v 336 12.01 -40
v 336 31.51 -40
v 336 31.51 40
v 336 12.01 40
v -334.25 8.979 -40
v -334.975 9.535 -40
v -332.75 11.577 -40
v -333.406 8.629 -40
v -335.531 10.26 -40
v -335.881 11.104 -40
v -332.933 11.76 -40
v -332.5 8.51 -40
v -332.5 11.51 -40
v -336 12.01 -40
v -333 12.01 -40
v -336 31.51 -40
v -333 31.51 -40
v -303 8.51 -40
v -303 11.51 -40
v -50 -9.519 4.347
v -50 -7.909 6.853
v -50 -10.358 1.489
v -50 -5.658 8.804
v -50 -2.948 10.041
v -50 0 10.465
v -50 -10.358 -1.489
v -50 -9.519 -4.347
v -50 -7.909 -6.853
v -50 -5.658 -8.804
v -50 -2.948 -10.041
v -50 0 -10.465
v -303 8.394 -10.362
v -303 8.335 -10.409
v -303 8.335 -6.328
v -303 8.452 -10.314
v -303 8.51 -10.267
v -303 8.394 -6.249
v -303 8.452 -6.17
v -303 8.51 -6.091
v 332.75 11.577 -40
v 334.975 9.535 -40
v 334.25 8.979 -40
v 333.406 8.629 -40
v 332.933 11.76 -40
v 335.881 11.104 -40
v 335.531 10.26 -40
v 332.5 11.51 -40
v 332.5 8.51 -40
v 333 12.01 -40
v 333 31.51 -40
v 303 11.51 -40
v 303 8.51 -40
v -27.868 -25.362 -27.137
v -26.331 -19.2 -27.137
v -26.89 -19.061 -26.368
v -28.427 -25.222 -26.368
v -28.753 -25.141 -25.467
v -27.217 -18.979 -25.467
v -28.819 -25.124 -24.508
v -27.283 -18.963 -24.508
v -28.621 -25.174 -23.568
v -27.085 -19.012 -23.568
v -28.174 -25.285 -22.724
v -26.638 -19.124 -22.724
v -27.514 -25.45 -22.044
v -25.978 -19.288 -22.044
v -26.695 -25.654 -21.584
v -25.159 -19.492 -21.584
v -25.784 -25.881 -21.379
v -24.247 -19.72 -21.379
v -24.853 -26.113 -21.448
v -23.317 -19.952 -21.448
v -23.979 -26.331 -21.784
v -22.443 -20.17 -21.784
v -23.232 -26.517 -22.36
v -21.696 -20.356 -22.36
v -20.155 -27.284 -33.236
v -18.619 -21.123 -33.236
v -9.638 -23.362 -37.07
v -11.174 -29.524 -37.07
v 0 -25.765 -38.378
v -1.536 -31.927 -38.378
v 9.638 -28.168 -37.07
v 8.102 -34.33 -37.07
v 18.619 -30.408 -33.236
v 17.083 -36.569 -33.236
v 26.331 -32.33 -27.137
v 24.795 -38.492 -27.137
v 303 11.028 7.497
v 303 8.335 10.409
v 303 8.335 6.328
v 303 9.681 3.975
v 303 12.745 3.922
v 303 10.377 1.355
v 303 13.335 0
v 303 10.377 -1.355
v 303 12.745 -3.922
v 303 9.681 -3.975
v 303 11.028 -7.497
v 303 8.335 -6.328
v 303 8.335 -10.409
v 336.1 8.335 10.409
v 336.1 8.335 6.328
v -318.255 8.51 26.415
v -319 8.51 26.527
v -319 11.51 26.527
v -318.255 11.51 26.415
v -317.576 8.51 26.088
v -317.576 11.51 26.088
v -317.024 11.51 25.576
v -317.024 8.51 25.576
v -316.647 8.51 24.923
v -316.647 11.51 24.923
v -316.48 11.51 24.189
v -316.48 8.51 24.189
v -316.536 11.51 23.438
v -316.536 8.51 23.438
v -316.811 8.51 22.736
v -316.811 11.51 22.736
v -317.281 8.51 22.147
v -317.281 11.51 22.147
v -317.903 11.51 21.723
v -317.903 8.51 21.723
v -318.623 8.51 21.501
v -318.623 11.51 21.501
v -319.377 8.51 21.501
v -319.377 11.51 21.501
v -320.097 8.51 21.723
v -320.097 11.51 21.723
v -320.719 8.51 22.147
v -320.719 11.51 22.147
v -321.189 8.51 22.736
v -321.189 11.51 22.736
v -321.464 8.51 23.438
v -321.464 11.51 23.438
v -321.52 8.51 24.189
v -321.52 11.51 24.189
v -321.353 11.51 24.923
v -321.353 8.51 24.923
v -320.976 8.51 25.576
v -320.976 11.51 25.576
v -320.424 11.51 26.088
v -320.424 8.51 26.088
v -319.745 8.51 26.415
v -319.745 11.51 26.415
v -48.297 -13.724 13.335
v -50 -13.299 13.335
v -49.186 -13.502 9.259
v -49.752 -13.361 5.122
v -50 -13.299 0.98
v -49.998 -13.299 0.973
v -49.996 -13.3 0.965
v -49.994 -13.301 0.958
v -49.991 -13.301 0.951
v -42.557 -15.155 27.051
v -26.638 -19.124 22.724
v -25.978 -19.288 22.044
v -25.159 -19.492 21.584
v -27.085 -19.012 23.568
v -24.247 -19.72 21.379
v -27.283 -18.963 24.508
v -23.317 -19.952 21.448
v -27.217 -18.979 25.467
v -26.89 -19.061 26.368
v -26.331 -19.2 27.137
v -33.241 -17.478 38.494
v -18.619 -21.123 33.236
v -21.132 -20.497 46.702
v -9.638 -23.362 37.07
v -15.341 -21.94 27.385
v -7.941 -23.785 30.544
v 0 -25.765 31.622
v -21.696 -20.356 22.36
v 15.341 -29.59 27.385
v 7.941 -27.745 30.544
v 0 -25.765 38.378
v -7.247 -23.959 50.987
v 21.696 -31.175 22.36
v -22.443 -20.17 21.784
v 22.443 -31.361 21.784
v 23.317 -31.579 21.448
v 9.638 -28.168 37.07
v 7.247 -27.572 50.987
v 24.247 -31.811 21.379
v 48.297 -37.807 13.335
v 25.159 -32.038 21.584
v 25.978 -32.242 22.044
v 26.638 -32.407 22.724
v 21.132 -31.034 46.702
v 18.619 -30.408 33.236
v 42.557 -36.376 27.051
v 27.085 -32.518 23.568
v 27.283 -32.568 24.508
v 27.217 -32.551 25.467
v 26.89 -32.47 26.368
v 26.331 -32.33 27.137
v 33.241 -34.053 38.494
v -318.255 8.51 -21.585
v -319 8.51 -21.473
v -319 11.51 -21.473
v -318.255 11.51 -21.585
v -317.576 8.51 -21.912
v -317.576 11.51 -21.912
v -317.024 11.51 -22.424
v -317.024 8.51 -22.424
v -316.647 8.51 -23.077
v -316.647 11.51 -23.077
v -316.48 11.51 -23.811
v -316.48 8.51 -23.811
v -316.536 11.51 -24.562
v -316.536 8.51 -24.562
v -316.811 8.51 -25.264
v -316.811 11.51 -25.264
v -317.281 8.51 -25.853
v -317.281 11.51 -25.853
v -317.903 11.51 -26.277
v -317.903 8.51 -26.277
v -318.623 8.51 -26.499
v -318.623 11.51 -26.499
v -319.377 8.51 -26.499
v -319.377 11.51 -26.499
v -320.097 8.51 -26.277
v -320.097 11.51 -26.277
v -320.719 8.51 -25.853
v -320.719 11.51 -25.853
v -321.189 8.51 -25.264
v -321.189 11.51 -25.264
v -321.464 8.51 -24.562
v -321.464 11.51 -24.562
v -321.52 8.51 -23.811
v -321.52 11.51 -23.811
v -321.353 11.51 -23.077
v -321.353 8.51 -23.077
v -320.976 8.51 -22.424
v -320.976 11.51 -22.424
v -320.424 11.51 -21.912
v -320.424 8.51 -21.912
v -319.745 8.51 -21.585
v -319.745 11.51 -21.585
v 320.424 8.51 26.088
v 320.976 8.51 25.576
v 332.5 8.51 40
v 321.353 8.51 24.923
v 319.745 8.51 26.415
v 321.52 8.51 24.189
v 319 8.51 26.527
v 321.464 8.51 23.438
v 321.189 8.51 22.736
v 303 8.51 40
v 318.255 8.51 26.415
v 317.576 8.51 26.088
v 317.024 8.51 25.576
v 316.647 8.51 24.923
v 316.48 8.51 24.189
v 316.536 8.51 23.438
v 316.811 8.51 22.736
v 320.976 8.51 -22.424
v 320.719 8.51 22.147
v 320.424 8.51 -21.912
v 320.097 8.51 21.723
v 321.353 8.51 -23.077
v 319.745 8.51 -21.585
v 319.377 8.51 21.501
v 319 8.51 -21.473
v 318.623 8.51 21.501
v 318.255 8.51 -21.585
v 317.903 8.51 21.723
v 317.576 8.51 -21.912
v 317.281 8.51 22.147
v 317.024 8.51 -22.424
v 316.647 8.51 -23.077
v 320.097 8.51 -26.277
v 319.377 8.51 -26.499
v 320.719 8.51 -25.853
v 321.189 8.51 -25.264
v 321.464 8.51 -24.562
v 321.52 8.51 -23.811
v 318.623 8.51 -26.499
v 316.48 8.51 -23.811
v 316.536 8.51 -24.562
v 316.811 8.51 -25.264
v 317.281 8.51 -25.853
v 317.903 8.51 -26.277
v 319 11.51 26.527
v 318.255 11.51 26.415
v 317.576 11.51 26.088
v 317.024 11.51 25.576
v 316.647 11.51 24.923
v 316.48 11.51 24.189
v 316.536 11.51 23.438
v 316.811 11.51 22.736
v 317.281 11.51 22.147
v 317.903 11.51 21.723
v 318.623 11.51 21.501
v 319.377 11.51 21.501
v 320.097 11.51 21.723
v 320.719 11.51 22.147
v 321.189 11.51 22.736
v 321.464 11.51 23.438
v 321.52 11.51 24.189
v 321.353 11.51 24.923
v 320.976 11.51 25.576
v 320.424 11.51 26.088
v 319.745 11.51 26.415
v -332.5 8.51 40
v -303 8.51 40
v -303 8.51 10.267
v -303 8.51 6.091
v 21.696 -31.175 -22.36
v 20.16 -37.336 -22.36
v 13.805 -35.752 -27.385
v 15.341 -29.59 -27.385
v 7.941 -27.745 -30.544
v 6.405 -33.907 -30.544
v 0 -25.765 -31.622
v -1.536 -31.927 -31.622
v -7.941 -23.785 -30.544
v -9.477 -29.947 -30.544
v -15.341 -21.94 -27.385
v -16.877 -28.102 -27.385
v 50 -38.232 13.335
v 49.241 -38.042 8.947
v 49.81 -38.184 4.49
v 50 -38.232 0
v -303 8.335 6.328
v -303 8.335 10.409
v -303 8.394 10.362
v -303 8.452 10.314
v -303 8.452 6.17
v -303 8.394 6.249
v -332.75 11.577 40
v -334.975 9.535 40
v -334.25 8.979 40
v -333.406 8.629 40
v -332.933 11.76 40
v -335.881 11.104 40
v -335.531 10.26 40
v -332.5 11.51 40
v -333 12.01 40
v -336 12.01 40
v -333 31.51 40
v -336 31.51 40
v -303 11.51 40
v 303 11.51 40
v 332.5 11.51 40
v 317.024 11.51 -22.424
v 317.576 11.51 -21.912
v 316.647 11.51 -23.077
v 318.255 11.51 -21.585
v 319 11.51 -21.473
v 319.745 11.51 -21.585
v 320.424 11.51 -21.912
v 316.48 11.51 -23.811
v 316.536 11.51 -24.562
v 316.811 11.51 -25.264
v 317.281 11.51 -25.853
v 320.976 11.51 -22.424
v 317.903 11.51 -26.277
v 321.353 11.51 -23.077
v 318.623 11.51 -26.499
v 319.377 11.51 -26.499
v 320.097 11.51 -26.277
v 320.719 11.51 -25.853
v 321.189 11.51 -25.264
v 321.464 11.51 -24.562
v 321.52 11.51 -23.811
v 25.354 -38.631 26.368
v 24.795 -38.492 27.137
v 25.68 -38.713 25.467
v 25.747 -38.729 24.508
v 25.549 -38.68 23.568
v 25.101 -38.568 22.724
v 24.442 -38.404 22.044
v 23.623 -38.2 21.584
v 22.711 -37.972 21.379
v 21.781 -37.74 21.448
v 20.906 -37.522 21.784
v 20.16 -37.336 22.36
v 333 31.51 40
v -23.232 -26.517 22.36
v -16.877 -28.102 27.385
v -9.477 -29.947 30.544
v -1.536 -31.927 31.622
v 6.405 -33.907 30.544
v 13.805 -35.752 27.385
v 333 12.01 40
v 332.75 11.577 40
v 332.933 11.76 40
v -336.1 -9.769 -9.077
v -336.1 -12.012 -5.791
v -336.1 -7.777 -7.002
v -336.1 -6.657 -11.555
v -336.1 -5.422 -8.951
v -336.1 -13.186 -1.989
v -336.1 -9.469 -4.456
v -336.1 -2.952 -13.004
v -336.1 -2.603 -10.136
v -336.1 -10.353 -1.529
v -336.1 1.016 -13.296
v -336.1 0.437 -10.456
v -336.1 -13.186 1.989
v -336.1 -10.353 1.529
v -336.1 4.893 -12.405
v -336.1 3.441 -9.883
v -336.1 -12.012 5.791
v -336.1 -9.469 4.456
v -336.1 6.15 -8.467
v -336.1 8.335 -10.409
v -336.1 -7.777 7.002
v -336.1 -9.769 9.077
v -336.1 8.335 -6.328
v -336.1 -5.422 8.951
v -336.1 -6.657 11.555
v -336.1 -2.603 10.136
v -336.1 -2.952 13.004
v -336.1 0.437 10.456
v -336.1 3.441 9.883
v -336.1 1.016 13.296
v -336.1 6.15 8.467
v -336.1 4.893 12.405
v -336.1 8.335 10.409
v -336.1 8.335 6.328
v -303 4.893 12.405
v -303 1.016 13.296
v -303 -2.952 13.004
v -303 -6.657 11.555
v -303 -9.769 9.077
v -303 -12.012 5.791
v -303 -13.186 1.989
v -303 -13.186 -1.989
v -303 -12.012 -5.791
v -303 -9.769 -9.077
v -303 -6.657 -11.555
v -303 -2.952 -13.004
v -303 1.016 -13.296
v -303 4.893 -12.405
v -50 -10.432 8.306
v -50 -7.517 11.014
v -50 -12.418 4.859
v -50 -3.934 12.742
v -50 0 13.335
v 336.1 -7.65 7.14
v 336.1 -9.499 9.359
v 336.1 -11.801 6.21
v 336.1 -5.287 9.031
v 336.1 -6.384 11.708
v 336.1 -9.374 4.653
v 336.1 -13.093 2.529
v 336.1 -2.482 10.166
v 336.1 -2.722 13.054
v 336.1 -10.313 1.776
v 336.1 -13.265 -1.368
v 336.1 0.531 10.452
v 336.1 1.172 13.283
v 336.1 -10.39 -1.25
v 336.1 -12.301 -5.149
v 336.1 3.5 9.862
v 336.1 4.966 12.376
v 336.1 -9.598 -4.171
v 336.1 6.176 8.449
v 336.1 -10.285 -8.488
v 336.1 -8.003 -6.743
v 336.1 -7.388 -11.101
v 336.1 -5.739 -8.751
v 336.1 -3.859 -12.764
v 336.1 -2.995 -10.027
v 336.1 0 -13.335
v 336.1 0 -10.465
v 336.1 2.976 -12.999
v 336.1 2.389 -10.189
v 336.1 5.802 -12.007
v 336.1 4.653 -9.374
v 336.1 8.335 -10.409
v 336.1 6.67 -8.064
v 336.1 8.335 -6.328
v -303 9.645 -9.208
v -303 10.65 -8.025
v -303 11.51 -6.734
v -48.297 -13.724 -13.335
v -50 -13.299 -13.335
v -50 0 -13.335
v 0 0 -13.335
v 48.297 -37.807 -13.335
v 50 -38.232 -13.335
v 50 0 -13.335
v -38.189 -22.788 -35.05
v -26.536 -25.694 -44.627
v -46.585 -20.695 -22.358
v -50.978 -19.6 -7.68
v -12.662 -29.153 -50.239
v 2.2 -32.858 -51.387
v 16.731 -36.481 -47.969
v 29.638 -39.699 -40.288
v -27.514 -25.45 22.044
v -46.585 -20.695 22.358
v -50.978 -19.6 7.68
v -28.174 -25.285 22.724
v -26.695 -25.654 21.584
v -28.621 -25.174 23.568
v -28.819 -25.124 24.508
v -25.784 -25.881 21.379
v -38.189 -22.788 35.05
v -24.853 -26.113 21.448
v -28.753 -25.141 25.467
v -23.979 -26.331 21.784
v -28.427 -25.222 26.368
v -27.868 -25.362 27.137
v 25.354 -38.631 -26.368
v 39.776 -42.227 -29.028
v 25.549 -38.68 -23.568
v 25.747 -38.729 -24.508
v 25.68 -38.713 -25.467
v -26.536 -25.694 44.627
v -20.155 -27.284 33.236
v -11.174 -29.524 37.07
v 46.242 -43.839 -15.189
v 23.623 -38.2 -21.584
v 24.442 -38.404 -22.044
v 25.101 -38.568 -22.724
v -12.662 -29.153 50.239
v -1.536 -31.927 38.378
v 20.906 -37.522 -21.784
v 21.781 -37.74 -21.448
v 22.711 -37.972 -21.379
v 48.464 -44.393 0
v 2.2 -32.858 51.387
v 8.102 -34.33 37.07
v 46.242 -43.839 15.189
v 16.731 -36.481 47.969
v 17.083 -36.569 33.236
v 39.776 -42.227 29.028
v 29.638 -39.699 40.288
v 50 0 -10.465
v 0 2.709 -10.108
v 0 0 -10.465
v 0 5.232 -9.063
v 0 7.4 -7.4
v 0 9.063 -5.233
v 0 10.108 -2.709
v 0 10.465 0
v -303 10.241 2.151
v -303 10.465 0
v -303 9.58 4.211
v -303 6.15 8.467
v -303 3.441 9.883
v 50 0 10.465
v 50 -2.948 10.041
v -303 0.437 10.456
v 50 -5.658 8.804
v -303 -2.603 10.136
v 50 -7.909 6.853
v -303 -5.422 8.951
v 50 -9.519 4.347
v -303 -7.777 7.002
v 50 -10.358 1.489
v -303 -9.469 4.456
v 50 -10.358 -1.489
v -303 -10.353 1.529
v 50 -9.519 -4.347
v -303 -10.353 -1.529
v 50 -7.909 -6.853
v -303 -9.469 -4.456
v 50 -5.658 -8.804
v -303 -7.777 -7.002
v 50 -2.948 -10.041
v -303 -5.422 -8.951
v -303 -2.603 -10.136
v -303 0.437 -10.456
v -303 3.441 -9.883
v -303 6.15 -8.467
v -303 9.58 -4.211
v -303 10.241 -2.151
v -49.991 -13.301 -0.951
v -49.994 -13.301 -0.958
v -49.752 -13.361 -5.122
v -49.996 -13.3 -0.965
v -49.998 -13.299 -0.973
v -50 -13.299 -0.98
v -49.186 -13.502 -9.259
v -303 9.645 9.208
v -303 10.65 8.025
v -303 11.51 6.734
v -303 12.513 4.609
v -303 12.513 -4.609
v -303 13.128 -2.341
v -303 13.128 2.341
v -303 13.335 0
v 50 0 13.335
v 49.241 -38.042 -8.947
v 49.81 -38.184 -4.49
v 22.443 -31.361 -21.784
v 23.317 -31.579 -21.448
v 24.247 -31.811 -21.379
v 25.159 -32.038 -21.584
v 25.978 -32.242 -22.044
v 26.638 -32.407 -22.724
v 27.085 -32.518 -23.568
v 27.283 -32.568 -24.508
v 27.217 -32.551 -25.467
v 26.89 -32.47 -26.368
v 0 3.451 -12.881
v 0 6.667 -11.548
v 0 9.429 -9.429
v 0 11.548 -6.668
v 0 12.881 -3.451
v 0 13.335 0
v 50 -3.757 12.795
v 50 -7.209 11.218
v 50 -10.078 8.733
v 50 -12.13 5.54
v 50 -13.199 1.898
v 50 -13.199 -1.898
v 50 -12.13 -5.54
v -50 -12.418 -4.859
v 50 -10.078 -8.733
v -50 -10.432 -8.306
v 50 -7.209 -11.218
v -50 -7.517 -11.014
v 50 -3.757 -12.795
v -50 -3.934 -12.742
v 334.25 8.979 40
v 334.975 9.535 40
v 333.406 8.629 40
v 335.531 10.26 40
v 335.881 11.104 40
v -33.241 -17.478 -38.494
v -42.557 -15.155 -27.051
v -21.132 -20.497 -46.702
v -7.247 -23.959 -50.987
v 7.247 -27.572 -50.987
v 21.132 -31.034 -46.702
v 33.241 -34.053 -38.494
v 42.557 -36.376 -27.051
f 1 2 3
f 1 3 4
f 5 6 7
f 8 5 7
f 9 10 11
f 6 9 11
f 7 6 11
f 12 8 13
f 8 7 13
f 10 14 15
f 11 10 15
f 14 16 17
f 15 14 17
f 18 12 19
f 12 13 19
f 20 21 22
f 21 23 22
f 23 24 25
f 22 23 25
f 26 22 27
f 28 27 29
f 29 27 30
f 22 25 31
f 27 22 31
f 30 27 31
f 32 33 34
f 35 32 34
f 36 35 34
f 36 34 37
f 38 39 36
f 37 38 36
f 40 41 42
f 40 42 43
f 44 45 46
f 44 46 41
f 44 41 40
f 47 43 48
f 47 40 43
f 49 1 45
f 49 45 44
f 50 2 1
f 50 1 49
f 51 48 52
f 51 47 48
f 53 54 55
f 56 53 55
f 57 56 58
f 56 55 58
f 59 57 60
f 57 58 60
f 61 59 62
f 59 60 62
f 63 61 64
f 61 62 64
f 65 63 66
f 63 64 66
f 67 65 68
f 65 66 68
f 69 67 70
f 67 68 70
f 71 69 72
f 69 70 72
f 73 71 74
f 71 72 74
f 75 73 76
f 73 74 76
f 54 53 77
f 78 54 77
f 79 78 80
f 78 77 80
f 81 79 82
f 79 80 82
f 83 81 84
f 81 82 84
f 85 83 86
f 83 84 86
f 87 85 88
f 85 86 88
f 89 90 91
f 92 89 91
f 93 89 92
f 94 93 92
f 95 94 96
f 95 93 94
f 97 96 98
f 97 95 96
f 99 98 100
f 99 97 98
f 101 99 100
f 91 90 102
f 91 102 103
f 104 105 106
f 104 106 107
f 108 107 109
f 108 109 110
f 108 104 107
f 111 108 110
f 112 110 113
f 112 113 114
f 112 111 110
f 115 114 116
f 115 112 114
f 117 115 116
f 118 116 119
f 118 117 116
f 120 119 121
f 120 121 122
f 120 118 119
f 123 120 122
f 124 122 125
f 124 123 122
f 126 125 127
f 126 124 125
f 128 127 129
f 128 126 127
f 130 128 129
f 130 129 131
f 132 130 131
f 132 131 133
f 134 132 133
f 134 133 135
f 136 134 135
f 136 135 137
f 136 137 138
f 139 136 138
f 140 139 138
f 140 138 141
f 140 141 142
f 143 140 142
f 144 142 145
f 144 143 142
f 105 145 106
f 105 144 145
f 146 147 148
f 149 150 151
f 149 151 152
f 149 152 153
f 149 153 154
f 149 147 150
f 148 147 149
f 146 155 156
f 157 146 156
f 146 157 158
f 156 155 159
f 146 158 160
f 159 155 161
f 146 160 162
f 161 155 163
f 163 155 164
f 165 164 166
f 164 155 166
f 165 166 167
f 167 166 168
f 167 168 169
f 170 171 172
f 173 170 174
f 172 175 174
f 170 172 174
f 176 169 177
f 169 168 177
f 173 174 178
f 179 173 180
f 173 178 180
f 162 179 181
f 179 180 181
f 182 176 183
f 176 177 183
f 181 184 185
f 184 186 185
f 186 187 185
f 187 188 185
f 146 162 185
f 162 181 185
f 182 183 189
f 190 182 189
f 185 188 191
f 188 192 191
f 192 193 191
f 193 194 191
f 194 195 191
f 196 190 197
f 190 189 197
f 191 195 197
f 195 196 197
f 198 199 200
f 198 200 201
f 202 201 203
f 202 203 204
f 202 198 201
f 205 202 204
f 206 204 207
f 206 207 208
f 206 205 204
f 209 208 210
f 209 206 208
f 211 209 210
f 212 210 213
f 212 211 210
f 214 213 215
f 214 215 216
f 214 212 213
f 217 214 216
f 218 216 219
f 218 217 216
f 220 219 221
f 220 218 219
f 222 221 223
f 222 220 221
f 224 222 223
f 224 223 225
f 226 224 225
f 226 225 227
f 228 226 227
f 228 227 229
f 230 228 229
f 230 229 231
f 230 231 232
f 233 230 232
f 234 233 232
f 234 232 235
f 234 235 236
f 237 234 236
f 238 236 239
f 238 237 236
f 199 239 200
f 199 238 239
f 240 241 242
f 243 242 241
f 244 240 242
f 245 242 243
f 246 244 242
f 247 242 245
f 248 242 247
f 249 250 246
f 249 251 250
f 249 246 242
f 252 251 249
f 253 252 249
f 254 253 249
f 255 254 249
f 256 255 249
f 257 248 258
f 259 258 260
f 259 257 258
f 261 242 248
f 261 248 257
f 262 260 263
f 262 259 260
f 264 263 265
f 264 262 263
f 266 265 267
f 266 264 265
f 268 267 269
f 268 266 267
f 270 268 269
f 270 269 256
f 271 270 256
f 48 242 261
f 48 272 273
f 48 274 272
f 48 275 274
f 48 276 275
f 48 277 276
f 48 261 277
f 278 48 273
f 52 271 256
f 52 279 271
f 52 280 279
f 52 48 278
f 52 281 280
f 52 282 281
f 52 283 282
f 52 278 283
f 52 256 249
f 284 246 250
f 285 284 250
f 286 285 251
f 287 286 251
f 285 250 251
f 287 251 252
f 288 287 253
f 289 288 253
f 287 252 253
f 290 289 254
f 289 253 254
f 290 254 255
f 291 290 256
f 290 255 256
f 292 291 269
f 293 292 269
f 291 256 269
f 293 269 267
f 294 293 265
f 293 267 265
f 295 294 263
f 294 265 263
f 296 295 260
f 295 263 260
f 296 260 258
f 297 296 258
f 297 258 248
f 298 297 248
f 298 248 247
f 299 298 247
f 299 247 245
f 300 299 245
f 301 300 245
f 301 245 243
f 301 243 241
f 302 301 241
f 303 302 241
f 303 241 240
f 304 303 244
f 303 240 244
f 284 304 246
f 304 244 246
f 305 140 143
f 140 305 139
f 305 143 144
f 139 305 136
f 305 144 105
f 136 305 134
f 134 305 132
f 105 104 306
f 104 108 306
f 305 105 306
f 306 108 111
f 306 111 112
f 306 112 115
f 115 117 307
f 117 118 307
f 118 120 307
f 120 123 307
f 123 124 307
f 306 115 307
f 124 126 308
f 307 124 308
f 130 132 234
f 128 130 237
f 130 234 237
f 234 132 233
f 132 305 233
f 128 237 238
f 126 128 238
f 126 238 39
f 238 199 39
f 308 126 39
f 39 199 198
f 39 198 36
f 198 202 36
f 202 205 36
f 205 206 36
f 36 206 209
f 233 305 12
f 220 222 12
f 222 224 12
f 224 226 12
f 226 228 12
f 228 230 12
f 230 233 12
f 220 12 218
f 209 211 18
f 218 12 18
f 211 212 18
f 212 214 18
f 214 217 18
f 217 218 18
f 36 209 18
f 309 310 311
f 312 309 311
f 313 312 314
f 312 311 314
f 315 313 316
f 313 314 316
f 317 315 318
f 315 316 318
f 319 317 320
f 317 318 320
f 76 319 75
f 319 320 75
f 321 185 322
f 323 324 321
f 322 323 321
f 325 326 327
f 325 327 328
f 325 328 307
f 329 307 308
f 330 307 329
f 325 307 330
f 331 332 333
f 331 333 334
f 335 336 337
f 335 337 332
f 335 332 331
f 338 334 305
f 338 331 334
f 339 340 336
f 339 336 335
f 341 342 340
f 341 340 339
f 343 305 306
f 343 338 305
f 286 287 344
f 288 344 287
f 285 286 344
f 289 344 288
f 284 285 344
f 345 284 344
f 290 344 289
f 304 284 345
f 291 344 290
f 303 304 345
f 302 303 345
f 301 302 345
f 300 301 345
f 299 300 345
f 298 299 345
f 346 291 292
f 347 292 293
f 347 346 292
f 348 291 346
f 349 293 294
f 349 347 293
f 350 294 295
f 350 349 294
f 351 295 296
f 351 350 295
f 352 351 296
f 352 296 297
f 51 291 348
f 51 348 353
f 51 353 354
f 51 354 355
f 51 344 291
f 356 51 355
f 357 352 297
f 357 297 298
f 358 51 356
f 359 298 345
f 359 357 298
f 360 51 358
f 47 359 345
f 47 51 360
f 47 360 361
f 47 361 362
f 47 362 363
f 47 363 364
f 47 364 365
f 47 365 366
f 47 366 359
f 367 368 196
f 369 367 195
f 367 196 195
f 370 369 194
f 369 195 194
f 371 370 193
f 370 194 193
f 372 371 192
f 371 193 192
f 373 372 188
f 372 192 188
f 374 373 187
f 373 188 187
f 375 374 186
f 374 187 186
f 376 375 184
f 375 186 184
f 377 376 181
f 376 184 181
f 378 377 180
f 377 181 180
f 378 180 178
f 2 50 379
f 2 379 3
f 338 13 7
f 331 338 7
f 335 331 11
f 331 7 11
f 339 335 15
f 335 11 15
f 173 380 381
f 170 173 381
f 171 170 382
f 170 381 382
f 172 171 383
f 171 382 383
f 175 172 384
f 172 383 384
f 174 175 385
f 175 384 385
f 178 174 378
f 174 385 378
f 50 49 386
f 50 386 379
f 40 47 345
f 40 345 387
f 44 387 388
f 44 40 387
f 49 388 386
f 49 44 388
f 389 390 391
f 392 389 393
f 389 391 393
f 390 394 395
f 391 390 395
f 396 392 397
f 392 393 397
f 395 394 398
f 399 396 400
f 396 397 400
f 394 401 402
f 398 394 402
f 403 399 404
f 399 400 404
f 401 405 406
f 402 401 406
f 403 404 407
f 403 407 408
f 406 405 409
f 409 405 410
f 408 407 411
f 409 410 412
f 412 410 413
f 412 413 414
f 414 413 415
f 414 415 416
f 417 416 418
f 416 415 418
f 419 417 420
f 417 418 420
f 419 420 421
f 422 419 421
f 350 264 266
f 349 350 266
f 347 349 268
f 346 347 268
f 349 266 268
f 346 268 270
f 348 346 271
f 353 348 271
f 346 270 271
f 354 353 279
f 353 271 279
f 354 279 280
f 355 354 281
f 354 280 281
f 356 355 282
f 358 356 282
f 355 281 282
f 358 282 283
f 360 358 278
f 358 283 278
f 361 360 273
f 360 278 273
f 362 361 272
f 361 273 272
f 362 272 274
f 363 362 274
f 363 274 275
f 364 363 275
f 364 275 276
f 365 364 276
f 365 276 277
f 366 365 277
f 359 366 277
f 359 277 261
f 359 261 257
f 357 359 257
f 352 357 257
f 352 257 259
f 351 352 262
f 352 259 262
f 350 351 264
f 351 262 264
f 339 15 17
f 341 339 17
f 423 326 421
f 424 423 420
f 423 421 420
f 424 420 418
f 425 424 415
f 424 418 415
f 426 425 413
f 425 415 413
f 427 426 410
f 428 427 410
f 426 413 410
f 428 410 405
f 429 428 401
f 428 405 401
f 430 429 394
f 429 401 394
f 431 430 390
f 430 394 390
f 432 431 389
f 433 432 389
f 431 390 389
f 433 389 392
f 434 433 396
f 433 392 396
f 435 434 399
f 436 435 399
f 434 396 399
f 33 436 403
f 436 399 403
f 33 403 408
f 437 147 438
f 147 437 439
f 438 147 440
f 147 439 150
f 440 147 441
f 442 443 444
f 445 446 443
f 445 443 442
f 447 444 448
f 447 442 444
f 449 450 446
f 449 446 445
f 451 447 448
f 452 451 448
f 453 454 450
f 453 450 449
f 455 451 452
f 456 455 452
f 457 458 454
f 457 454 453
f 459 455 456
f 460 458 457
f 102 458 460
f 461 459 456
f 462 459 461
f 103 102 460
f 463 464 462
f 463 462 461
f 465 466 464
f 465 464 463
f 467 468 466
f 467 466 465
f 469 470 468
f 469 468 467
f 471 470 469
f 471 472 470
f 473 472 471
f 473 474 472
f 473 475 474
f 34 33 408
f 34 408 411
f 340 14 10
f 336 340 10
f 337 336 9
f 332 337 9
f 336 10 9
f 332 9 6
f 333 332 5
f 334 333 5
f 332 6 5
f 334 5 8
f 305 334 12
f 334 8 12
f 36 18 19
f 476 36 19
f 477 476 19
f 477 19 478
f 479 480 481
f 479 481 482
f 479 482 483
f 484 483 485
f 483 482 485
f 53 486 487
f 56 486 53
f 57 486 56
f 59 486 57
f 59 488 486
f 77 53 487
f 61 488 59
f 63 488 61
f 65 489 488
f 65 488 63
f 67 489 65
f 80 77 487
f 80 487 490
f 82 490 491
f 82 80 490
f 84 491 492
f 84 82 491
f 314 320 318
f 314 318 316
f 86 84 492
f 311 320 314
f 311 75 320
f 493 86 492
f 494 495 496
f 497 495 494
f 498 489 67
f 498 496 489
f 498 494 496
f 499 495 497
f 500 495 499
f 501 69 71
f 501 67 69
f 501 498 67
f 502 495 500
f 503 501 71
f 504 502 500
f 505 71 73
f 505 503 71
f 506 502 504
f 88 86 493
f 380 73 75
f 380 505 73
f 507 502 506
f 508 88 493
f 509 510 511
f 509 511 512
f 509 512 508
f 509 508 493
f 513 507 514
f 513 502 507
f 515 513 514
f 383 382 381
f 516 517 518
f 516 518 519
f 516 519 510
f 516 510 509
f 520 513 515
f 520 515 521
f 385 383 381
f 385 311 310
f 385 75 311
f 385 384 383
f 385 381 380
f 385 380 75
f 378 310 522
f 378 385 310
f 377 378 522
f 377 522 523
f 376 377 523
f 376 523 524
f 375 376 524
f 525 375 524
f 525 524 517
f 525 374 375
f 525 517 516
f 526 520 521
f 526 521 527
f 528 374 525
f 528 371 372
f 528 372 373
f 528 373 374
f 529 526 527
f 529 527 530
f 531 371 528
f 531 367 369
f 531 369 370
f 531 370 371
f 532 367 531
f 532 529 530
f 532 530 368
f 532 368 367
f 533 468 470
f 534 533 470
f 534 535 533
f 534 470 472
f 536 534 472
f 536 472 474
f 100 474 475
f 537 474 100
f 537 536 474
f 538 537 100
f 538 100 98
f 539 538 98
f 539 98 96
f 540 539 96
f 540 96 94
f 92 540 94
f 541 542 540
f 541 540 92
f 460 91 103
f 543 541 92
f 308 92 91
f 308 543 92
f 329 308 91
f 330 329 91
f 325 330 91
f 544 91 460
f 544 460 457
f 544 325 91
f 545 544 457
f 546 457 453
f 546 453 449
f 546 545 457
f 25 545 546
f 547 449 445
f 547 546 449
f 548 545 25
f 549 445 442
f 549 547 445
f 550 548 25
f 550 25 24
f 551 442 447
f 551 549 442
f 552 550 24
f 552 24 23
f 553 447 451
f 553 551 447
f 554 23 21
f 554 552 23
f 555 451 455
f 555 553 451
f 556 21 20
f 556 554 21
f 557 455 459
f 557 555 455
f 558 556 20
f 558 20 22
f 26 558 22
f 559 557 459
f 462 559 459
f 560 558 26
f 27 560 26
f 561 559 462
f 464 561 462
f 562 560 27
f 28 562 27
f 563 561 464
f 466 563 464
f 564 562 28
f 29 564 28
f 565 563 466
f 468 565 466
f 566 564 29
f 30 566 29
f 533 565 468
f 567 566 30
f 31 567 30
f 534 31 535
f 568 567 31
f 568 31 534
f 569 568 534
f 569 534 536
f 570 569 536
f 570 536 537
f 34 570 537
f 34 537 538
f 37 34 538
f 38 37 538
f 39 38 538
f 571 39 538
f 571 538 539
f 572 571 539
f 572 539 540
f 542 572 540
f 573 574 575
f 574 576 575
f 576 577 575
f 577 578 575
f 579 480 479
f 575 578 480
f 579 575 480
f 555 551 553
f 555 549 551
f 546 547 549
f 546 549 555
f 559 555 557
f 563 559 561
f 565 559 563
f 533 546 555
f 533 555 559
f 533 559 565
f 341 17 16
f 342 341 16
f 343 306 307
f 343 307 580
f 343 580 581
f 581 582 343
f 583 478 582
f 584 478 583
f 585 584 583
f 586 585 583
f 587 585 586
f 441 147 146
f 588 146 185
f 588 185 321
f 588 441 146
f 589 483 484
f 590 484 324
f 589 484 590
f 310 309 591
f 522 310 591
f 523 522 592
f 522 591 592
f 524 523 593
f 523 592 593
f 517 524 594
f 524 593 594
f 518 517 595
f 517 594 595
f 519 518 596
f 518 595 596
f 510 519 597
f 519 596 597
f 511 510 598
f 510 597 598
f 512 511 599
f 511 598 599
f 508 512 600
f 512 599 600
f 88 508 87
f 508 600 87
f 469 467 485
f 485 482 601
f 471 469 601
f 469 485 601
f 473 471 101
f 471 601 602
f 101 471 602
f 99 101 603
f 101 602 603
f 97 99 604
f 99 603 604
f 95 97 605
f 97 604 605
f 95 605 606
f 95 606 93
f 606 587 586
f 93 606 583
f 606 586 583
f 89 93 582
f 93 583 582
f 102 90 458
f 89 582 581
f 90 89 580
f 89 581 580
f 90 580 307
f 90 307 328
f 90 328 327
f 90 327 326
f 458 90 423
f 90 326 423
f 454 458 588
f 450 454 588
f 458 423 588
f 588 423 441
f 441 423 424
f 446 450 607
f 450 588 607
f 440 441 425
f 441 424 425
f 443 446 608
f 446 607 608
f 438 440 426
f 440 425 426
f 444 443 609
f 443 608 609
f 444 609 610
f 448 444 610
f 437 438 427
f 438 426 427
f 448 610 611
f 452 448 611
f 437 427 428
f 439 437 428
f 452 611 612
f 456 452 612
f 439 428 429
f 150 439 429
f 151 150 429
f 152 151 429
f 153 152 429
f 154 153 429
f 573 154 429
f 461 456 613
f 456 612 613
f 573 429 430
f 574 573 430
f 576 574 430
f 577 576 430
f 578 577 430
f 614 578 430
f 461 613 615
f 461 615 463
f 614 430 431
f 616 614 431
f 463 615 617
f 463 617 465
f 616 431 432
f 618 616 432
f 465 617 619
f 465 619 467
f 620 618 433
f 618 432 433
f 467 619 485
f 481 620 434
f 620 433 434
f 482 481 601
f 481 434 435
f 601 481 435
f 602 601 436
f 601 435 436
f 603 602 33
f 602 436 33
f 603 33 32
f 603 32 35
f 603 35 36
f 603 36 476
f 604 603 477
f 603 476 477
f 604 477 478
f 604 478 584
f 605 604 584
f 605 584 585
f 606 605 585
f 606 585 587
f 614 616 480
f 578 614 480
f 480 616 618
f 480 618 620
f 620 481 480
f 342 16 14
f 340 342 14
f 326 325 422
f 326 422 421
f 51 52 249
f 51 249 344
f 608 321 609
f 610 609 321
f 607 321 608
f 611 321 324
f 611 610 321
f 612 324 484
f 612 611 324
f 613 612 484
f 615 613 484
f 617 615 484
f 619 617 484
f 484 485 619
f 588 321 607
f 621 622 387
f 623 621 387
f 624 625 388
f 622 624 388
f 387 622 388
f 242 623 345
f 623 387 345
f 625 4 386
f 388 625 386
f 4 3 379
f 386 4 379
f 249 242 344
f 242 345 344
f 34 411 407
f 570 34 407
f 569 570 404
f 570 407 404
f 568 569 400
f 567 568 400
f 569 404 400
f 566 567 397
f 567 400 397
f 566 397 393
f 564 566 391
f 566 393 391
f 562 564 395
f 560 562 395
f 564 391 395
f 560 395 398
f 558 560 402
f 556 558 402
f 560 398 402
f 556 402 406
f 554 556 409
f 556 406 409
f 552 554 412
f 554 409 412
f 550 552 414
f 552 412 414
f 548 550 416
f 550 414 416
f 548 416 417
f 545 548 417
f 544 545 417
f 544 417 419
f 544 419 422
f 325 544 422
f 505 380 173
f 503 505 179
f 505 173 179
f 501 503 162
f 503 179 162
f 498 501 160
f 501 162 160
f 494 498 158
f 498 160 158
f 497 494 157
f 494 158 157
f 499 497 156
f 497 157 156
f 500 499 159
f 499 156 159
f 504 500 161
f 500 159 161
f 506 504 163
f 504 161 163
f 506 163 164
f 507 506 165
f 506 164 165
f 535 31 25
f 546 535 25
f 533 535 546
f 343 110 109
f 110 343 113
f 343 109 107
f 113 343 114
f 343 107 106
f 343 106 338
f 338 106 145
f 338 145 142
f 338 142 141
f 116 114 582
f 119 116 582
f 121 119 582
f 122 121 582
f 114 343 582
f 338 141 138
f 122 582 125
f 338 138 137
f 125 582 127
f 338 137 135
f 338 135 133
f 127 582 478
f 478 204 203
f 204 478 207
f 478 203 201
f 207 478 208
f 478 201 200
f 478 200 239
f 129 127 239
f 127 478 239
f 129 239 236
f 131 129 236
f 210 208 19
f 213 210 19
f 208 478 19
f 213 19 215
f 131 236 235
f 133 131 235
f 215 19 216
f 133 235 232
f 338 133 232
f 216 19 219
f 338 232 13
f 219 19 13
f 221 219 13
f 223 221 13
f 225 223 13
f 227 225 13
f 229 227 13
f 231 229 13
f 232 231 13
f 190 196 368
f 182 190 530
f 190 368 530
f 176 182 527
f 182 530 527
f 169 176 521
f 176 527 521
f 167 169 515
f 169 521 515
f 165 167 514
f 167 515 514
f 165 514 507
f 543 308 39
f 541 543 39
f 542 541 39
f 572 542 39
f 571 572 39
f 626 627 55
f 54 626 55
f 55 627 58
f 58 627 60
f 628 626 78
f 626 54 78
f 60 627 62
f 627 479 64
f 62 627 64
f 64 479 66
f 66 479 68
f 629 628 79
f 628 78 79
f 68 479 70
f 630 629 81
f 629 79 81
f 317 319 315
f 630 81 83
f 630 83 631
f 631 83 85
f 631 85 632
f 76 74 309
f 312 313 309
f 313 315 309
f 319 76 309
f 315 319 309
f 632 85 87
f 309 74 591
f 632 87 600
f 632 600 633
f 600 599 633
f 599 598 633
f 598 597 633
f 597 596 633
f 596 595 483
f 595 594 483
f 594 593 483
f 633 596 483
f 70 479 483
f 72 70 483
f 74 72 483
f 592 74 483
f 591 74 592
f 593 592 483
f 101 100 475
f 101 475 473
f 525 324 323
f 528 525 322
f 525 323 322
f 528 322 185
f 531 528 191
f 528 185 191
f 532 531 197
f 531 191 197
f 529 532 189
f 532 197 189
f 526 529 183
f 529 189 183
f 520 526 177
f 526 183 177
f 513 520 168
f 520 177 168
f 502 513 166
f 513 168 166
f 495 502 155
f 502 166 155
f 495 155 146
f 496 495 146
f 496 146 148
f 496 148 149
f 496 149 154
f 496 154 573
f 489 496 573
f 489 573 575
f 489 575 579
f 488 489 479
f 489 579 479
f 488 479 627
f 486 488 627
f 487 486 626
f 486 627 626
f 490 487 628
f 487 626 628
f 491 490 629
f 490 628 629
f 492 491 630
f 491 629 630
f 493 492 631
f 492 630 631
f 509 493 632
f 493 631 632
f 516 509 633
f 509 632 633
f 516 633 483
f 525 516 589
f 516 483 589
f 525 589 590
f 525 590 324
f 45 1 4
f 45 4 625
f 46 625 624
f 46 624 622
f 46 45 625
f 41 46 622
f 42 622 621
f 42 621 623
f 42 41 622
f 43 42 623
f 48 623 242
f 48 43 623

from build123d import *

# Parameters (mm, degrees)
SKETCH1_R                           = 13.335
SKETCH1_R_2                         = 10.465
BOSS_EXTRUDE1_DEPTH                 = 336.1
CUT_EXTRUDE3_START                  = -33.1
CUT_EXTRUDE3_DEPTH                  = 33.1
BASE_FLANGE2_DEPTH                  = 40
BASE_FLANGE2_DEPTH_BACK             = 40
SKETCH36_W                          = 2.5273
SKETCH36_H                          = 50
F_8_0_199_DIAMETER_HOLE4_AT_2_COUNT = 2
F_8_0_199_DIAMETER_HOLE4_AT_2_PITCH = 48
MIRROR5_START                       = -303
MIRROR5_OUTLINE_R                   = 13.335
MIRROR5_OUTLINE_R_2                 = 10.465
MIRROR5_DEPTH                       = 303
MIRROR5_START_2                     = -336.1
MIRROR5_2_DEPTH                     = 33.1
BOSS_EXTRUDE3_REACH                 = 341.935
SKETCH39_W                          = 100
SKETCH39_H                          = 26.67
SKETCH40_R                          = 51.530681467
BOSS_EXTRUDE4_DEPTH                 = 6.35
SKETCH43_W                          = 3.3782
SKETCH43_H                          = 143.233967446
F_1_4_CLEARANCE_HOLE1_AT_2_COUNT    = 2
F_1_4_CLEARANCE_HOLE1_AT_2_PITCH    = 49.497474683
F_1_4_CLEARANCE_HOLE1_AT_3_COUNT    = 2
F_1_4_CLEARANCE_HOLE1_AT_3_PITCH    = 70
F_1_4_CLEARANCE_HOLE1_AT_4_COUNT    = 2
F_1_4_CLEARANCE_HOLE1_AT_4_PITCH    = 49.497474683
F_1_4_CLEARANCE_HOLE1_AT_5_COUNT    = 2
F_1_4_CLEARANCE_HOLE1_AT_5_PITCH    = 26.787840266
F_1_4_CLEARANCE_HOLE1_AT_6_COUNT    = 2
F_1_4_CLEARANCE_HOLE1_AT_6_PITCH    = 64.671567276
CUT_EXTRUDE4_DEPTH                  = 354.000635368


# Read off the part's stored shape, not the designer's step: Mirror5
# Sheet-metal steps are written as plain solids
with BuildPart() as part:
    # Sketch1 → Boss-Extrude1 (new body)
    with BuildSketch(Plane(origin=(0, 0, 0), x_dir=(0, 0, -1), z_dir=(1, 0, 0))):
        Circle(SKETCH1_R)
        Circle(SKETCH1_R_2, mode=Mode.SUBTRACT)
    extrude(amount=BOSS_EXTRUDE1_DEPTH)

    # Sketch4 → Cut-Extrude3 (cut)
    with BuildSketch(Plane(origin=(336.1, 0, 0), x_dir=(0, 0, -1), z_dir=(1, 0, 0)).offset(CUT_EXTRUDE3_START)):
        with BuildLine():
            Line((-10.409130607, 8.335), (10.409130607, 8.335))
            ThreePointArc((10.409130607, 8.335), (0, 13.335), (-10.409130607, 8.335))
        make_face()
    extrude(amount=CUT_EXTRUDE3_DEPTH, mode=Mode.SUBTRACT)



with BuildPart() as body_2:
    # Sketch31 → Base-Flange2 (new, two sides: drawn at the far end of the back side and taken through both)
    with BuildSketch(Plane.XY.offset(-BASE_FLANGE2_DEPTH_BACK)):
        with BuildLine():
            Line((303, 11.51), (332.5, 11.51))
            ThreePointArc((332.5, 11.51), (332.853553391, 11.656446609), (333, 12.01))
            Line((333, 12.01), (333, 31.51))
            Line((333, 31.51), (336, 31.51))
            Line((336, 31.51), (336, 12.01))
            ThreePointArc((336, 12.01), (334.974873734, 9.535126266), (332.5, 8.51))
            Line((332.5, 8.51), (303, 8.51))
            Line((303, 8.51), (303, 11.51))
        make_face()
    extrude(amount=BASE_FLANGE2_DEPTH + BASE_FLANGE2_DEPTH_BACK)

    # Sketch36 → #8 (0.199) Diameter Hole4 (revolve, cut)
    with BuildSketch(Plane(origin=(319, 11.51, -24), x_dir=(0, 0, 1), z_dir=(1, 0, 0))):
        with Locations((1.26365, 25)):
            Rectangle(SKETCH36_W, SKETCH36_H)
    f_8_0_199_diameter_hole4 = revolve(axis=Axis((319, 17.86, -24), (0, -1, 0)), mode=Mode.SUBTRACT)

    # #8 (0.199) Diameter Hole4 at 2: #8 (0.199) Diameter Hole4 ×2
    with Locations(*[(0, 0, i * F_8_0_199_DIAMETER_HOLE4_AT_2_PITCH) for i in range(1, F_8_0_199_DIAMETER_HOLE4_AT_2_COUNT)]):
        add(f_8_0_199_diameter_hole4, mode=Mode.SUBTRACT)


with BuildPart() as body_3:
    # Mirror4: mirrored copy
    add(body_2.part.mirror(Plane(origin=(0, 0, 0), x_dir=(0, 0, 1), z_dir=(1, 0, 0))))


with BuildPart() as part_1:
    add(part.part)

    add(body_3.part)  # Mirror5 merges body 3
    # Mirror5 outline → Mirror5 (add)
    with BuildSketch(Plane.YZ.offset(MIRROR5_START)):
        Circle(MIRROR5_OUTLINE_R)
        Circle(MIRROR5_OUTLINE_R_2, mode=Mode.SUBTRACT)
    extrude(amount=MIRROR5_DEPTH)

    # Mirror5 2 outline → Mirror5 2 (add)
    with BuildSketch(Plane.YZ.offset(MIRROR5_START_2)):
        with BuildLine():
            Line((8.335, 6.32803287), (8.335, 10.409130607))
            ThreePointArc((8.335, 10.409130607), (-13.335, 0), (8.335, -10.409130607))
            Line((8.335, -10.409130607), (8.335, -6.32803287))
            ThreePointArc((8.335, -6.32803287), (-10.465, 0), (8.335, 6.32803287))
        make_face()
    extrude(amount=MIRROR5_2_DEPTH)

    # Boss-Extrude3: up to this plane
    boss_extrude3_end = Plane(origin=(-6.04804739, -24.257393157, 0), z_dir=(0.24192189559967145, 0.9702957262759956, 0))
    # Sketch39 → Boss-Extrude3 (add, up to the surface)
    with BuildSketch(Plane(origin=(0, 0, 0), x_dir=(1, 0, 0), z_dir=(0, 1, 0)), mode=Mode.PRIVATE) as boss_extrude3_sk1:
        Rectangle(SKETCH39_W, SKETCH39_H)
    boss_extrude3_tool1 = split(extrude(boss_extrude3_sk1.sketch, amount=-BOSS_EXTRUDE3_REACH, mode=Mode.PRIVATE), bisect_by=boss_extrude3_end, keep=Keep.BOTH, mode=Mode.PRIVATE)
    add(boss_extrude3_tool1.solids().sort_by_distance((0, 0, 0))[0])

    # Sketch40 → Boss-Extrude4 (add)
    with BuildSketch(Plane(origin=(-6.04804739, -24.257393157, 0), x_dir=(-0.9702957262759956, 0.24192189559967145, 0), z_dir=(-0.24192189559967145, -0.9702957262759956, 0))):
        with Locations(Location((-6.233200071, 0, 0), (0, 0, 180))):
            Circle(SKETCH40_R)
    extrude(amount=BOSS_EXTRUDE4_DEPTH)

    # Sketch43 → 1/4 Clearance Hole1 (revolve, cut)
    with BuildSketch(Plane(origin=(-25.54979811, -25.939457144, 24.748737342), x_dir=(0.9702957262759956, -0.24192189559967145, 0), z_dir=(0, 0, 1))):
        with Locations((1.6891, 71.616983723)):
            Rectangle(SKETCH43_W, SKETCH43_H)
    f_1_4_clearance_hole1 = revolve(axis=Axis((-27.086002147, -32.100835006, 24.748737342), (0.24192189559967142, 0.9702957262759956, 0)), mode=Mode.SUBTRACT)

    # 1/4 Clearance Hole1 at 2: 1/4 Clearance Hole1 ×2
    with Locations(*[Vector(0.9702957262759956, -0.24192189559967142, -4.076857218435412e-13) * (i * F_1_4_CLEARANCE_HOLE1_AT_2_PITCH) for i in range(1, F_1_4_CLEARANCE_HOLE1_AT_2_COUNT)]):
        add(f_1_4_clearance_hole1, mode=Mode.SUBTRACT)

    # 1/4 Clearance Hole1 at 3: 1/4 Clearance Hole1 ×2
    with Locations(*[Vector(0.6861026878060814, -0.17106461289603136, -0.7071067811865488) * (i * F_1_4_CLEARANCE_HOLE1_AT_3_PITCH) for i in range(1, F_1_4_CLEARANCE_HOLE1_AT_3_COUNT)]):
        add(f_1_4_clearance_hole1, mode=Mode.SUBTRACT)

    # 1/4 Clearance Hole1 at 4: 1/4 Clearance Hole1 ×2
    with Locations(*[(0, 0, -i * F_1_4_CLEARANCE_HOLE1_AT_4_PITCH) for i in range(1, F_1_4_CLEARANCE_HOLE1_AT_4_COUNT)]):
        add(f_1_4_clearance_hole1, mode=Mode.SUBTRACT)

    # 1/4 Clearance Hole1 at 5: 1/4 Clearance Hole1 ×2
    with Locations(*[Vector(0.8964363619897173, -0.22350668781090646, 0.3826834323647138) * (i * F_1_4_CLEARANCE_HOLE1_AT_5_PITCH) for i in range(1, F_1_4_CLEARANCE_HOLE1_AT_5_COUNT)]):
        add(f_1_4_clearance_hole1, mode=Mode.SUBTRACT)

    # 1/4 Clearance Hole1 at 6: 1/4 Clearance Hole1 ×2
    with Locations(*[Vector(0.37131609894011086, -0.09257950137226025, -0.9238795325114425) * (i * F_1_4_CLEARANCE_HOLE1_AT_6_PITCH) for i in range(1, F_1_4_CLEARANCE_HOLE1_AT_6_COUNT)]):
        add(f_1_4_clearance_hole1, mode=Mode.SUBTRACT)

    # Sketch45 → Cut-Extrude4 (cut, through all)
    with BuildSketch(Plane(origin=(-7.584251427, -30.418771019, 0), x_dir=(-0.9702957262759956, 0.24192189559967145, 0), z_dir=(-0.24192189559967145, -0.9702957262759956, 0))):
        with BuildLine():
            ThreePointArc((-33.370685541, -27.13748547), (-6.233200071, -38.3782), (20.904285399, -27.13748547))
            ThreePointArc((20.904285399, -27.13748547), (20.904285399, -22.359989213), (16.126789142, -22.359989213))
            ThreePointArc((16.126789142, -22.359989213), (-6.233200071, -31.6218), (-28.593189284, -22.359989213))
            ThreePointArc((-28.593189284, -22.359989213), (-33.370685541, -22.359989213), (-33.370685541, -27.13748547))
        make_face()
        with BuildLine():
            ThreePointArc((20.904285399, 27.13748547), (-6.233200071, 38.3782), (-33.370685541, 27.13748547))
            ThreePointArc((-33.370685541, 27.13748547), (-33.370685541, 22.359989213), (-28.593189284, 22.359989213))
            ThreePointArc((-28.593189284, 22.359989213), (-6.233200071, 31.6218), (16.126789142, 22.359989213))
            ThreePointArc((16.126789142, 22.359989213), (20.904285399, 22.359989213), (20.904285399, 27.13748547))
        make_face()
    extrude(amount=-CUT_EXTRUDE4_DEPTH, mode=Mode.SUBTRACT)


solid = Compound([body_2.part, part_1.part])
